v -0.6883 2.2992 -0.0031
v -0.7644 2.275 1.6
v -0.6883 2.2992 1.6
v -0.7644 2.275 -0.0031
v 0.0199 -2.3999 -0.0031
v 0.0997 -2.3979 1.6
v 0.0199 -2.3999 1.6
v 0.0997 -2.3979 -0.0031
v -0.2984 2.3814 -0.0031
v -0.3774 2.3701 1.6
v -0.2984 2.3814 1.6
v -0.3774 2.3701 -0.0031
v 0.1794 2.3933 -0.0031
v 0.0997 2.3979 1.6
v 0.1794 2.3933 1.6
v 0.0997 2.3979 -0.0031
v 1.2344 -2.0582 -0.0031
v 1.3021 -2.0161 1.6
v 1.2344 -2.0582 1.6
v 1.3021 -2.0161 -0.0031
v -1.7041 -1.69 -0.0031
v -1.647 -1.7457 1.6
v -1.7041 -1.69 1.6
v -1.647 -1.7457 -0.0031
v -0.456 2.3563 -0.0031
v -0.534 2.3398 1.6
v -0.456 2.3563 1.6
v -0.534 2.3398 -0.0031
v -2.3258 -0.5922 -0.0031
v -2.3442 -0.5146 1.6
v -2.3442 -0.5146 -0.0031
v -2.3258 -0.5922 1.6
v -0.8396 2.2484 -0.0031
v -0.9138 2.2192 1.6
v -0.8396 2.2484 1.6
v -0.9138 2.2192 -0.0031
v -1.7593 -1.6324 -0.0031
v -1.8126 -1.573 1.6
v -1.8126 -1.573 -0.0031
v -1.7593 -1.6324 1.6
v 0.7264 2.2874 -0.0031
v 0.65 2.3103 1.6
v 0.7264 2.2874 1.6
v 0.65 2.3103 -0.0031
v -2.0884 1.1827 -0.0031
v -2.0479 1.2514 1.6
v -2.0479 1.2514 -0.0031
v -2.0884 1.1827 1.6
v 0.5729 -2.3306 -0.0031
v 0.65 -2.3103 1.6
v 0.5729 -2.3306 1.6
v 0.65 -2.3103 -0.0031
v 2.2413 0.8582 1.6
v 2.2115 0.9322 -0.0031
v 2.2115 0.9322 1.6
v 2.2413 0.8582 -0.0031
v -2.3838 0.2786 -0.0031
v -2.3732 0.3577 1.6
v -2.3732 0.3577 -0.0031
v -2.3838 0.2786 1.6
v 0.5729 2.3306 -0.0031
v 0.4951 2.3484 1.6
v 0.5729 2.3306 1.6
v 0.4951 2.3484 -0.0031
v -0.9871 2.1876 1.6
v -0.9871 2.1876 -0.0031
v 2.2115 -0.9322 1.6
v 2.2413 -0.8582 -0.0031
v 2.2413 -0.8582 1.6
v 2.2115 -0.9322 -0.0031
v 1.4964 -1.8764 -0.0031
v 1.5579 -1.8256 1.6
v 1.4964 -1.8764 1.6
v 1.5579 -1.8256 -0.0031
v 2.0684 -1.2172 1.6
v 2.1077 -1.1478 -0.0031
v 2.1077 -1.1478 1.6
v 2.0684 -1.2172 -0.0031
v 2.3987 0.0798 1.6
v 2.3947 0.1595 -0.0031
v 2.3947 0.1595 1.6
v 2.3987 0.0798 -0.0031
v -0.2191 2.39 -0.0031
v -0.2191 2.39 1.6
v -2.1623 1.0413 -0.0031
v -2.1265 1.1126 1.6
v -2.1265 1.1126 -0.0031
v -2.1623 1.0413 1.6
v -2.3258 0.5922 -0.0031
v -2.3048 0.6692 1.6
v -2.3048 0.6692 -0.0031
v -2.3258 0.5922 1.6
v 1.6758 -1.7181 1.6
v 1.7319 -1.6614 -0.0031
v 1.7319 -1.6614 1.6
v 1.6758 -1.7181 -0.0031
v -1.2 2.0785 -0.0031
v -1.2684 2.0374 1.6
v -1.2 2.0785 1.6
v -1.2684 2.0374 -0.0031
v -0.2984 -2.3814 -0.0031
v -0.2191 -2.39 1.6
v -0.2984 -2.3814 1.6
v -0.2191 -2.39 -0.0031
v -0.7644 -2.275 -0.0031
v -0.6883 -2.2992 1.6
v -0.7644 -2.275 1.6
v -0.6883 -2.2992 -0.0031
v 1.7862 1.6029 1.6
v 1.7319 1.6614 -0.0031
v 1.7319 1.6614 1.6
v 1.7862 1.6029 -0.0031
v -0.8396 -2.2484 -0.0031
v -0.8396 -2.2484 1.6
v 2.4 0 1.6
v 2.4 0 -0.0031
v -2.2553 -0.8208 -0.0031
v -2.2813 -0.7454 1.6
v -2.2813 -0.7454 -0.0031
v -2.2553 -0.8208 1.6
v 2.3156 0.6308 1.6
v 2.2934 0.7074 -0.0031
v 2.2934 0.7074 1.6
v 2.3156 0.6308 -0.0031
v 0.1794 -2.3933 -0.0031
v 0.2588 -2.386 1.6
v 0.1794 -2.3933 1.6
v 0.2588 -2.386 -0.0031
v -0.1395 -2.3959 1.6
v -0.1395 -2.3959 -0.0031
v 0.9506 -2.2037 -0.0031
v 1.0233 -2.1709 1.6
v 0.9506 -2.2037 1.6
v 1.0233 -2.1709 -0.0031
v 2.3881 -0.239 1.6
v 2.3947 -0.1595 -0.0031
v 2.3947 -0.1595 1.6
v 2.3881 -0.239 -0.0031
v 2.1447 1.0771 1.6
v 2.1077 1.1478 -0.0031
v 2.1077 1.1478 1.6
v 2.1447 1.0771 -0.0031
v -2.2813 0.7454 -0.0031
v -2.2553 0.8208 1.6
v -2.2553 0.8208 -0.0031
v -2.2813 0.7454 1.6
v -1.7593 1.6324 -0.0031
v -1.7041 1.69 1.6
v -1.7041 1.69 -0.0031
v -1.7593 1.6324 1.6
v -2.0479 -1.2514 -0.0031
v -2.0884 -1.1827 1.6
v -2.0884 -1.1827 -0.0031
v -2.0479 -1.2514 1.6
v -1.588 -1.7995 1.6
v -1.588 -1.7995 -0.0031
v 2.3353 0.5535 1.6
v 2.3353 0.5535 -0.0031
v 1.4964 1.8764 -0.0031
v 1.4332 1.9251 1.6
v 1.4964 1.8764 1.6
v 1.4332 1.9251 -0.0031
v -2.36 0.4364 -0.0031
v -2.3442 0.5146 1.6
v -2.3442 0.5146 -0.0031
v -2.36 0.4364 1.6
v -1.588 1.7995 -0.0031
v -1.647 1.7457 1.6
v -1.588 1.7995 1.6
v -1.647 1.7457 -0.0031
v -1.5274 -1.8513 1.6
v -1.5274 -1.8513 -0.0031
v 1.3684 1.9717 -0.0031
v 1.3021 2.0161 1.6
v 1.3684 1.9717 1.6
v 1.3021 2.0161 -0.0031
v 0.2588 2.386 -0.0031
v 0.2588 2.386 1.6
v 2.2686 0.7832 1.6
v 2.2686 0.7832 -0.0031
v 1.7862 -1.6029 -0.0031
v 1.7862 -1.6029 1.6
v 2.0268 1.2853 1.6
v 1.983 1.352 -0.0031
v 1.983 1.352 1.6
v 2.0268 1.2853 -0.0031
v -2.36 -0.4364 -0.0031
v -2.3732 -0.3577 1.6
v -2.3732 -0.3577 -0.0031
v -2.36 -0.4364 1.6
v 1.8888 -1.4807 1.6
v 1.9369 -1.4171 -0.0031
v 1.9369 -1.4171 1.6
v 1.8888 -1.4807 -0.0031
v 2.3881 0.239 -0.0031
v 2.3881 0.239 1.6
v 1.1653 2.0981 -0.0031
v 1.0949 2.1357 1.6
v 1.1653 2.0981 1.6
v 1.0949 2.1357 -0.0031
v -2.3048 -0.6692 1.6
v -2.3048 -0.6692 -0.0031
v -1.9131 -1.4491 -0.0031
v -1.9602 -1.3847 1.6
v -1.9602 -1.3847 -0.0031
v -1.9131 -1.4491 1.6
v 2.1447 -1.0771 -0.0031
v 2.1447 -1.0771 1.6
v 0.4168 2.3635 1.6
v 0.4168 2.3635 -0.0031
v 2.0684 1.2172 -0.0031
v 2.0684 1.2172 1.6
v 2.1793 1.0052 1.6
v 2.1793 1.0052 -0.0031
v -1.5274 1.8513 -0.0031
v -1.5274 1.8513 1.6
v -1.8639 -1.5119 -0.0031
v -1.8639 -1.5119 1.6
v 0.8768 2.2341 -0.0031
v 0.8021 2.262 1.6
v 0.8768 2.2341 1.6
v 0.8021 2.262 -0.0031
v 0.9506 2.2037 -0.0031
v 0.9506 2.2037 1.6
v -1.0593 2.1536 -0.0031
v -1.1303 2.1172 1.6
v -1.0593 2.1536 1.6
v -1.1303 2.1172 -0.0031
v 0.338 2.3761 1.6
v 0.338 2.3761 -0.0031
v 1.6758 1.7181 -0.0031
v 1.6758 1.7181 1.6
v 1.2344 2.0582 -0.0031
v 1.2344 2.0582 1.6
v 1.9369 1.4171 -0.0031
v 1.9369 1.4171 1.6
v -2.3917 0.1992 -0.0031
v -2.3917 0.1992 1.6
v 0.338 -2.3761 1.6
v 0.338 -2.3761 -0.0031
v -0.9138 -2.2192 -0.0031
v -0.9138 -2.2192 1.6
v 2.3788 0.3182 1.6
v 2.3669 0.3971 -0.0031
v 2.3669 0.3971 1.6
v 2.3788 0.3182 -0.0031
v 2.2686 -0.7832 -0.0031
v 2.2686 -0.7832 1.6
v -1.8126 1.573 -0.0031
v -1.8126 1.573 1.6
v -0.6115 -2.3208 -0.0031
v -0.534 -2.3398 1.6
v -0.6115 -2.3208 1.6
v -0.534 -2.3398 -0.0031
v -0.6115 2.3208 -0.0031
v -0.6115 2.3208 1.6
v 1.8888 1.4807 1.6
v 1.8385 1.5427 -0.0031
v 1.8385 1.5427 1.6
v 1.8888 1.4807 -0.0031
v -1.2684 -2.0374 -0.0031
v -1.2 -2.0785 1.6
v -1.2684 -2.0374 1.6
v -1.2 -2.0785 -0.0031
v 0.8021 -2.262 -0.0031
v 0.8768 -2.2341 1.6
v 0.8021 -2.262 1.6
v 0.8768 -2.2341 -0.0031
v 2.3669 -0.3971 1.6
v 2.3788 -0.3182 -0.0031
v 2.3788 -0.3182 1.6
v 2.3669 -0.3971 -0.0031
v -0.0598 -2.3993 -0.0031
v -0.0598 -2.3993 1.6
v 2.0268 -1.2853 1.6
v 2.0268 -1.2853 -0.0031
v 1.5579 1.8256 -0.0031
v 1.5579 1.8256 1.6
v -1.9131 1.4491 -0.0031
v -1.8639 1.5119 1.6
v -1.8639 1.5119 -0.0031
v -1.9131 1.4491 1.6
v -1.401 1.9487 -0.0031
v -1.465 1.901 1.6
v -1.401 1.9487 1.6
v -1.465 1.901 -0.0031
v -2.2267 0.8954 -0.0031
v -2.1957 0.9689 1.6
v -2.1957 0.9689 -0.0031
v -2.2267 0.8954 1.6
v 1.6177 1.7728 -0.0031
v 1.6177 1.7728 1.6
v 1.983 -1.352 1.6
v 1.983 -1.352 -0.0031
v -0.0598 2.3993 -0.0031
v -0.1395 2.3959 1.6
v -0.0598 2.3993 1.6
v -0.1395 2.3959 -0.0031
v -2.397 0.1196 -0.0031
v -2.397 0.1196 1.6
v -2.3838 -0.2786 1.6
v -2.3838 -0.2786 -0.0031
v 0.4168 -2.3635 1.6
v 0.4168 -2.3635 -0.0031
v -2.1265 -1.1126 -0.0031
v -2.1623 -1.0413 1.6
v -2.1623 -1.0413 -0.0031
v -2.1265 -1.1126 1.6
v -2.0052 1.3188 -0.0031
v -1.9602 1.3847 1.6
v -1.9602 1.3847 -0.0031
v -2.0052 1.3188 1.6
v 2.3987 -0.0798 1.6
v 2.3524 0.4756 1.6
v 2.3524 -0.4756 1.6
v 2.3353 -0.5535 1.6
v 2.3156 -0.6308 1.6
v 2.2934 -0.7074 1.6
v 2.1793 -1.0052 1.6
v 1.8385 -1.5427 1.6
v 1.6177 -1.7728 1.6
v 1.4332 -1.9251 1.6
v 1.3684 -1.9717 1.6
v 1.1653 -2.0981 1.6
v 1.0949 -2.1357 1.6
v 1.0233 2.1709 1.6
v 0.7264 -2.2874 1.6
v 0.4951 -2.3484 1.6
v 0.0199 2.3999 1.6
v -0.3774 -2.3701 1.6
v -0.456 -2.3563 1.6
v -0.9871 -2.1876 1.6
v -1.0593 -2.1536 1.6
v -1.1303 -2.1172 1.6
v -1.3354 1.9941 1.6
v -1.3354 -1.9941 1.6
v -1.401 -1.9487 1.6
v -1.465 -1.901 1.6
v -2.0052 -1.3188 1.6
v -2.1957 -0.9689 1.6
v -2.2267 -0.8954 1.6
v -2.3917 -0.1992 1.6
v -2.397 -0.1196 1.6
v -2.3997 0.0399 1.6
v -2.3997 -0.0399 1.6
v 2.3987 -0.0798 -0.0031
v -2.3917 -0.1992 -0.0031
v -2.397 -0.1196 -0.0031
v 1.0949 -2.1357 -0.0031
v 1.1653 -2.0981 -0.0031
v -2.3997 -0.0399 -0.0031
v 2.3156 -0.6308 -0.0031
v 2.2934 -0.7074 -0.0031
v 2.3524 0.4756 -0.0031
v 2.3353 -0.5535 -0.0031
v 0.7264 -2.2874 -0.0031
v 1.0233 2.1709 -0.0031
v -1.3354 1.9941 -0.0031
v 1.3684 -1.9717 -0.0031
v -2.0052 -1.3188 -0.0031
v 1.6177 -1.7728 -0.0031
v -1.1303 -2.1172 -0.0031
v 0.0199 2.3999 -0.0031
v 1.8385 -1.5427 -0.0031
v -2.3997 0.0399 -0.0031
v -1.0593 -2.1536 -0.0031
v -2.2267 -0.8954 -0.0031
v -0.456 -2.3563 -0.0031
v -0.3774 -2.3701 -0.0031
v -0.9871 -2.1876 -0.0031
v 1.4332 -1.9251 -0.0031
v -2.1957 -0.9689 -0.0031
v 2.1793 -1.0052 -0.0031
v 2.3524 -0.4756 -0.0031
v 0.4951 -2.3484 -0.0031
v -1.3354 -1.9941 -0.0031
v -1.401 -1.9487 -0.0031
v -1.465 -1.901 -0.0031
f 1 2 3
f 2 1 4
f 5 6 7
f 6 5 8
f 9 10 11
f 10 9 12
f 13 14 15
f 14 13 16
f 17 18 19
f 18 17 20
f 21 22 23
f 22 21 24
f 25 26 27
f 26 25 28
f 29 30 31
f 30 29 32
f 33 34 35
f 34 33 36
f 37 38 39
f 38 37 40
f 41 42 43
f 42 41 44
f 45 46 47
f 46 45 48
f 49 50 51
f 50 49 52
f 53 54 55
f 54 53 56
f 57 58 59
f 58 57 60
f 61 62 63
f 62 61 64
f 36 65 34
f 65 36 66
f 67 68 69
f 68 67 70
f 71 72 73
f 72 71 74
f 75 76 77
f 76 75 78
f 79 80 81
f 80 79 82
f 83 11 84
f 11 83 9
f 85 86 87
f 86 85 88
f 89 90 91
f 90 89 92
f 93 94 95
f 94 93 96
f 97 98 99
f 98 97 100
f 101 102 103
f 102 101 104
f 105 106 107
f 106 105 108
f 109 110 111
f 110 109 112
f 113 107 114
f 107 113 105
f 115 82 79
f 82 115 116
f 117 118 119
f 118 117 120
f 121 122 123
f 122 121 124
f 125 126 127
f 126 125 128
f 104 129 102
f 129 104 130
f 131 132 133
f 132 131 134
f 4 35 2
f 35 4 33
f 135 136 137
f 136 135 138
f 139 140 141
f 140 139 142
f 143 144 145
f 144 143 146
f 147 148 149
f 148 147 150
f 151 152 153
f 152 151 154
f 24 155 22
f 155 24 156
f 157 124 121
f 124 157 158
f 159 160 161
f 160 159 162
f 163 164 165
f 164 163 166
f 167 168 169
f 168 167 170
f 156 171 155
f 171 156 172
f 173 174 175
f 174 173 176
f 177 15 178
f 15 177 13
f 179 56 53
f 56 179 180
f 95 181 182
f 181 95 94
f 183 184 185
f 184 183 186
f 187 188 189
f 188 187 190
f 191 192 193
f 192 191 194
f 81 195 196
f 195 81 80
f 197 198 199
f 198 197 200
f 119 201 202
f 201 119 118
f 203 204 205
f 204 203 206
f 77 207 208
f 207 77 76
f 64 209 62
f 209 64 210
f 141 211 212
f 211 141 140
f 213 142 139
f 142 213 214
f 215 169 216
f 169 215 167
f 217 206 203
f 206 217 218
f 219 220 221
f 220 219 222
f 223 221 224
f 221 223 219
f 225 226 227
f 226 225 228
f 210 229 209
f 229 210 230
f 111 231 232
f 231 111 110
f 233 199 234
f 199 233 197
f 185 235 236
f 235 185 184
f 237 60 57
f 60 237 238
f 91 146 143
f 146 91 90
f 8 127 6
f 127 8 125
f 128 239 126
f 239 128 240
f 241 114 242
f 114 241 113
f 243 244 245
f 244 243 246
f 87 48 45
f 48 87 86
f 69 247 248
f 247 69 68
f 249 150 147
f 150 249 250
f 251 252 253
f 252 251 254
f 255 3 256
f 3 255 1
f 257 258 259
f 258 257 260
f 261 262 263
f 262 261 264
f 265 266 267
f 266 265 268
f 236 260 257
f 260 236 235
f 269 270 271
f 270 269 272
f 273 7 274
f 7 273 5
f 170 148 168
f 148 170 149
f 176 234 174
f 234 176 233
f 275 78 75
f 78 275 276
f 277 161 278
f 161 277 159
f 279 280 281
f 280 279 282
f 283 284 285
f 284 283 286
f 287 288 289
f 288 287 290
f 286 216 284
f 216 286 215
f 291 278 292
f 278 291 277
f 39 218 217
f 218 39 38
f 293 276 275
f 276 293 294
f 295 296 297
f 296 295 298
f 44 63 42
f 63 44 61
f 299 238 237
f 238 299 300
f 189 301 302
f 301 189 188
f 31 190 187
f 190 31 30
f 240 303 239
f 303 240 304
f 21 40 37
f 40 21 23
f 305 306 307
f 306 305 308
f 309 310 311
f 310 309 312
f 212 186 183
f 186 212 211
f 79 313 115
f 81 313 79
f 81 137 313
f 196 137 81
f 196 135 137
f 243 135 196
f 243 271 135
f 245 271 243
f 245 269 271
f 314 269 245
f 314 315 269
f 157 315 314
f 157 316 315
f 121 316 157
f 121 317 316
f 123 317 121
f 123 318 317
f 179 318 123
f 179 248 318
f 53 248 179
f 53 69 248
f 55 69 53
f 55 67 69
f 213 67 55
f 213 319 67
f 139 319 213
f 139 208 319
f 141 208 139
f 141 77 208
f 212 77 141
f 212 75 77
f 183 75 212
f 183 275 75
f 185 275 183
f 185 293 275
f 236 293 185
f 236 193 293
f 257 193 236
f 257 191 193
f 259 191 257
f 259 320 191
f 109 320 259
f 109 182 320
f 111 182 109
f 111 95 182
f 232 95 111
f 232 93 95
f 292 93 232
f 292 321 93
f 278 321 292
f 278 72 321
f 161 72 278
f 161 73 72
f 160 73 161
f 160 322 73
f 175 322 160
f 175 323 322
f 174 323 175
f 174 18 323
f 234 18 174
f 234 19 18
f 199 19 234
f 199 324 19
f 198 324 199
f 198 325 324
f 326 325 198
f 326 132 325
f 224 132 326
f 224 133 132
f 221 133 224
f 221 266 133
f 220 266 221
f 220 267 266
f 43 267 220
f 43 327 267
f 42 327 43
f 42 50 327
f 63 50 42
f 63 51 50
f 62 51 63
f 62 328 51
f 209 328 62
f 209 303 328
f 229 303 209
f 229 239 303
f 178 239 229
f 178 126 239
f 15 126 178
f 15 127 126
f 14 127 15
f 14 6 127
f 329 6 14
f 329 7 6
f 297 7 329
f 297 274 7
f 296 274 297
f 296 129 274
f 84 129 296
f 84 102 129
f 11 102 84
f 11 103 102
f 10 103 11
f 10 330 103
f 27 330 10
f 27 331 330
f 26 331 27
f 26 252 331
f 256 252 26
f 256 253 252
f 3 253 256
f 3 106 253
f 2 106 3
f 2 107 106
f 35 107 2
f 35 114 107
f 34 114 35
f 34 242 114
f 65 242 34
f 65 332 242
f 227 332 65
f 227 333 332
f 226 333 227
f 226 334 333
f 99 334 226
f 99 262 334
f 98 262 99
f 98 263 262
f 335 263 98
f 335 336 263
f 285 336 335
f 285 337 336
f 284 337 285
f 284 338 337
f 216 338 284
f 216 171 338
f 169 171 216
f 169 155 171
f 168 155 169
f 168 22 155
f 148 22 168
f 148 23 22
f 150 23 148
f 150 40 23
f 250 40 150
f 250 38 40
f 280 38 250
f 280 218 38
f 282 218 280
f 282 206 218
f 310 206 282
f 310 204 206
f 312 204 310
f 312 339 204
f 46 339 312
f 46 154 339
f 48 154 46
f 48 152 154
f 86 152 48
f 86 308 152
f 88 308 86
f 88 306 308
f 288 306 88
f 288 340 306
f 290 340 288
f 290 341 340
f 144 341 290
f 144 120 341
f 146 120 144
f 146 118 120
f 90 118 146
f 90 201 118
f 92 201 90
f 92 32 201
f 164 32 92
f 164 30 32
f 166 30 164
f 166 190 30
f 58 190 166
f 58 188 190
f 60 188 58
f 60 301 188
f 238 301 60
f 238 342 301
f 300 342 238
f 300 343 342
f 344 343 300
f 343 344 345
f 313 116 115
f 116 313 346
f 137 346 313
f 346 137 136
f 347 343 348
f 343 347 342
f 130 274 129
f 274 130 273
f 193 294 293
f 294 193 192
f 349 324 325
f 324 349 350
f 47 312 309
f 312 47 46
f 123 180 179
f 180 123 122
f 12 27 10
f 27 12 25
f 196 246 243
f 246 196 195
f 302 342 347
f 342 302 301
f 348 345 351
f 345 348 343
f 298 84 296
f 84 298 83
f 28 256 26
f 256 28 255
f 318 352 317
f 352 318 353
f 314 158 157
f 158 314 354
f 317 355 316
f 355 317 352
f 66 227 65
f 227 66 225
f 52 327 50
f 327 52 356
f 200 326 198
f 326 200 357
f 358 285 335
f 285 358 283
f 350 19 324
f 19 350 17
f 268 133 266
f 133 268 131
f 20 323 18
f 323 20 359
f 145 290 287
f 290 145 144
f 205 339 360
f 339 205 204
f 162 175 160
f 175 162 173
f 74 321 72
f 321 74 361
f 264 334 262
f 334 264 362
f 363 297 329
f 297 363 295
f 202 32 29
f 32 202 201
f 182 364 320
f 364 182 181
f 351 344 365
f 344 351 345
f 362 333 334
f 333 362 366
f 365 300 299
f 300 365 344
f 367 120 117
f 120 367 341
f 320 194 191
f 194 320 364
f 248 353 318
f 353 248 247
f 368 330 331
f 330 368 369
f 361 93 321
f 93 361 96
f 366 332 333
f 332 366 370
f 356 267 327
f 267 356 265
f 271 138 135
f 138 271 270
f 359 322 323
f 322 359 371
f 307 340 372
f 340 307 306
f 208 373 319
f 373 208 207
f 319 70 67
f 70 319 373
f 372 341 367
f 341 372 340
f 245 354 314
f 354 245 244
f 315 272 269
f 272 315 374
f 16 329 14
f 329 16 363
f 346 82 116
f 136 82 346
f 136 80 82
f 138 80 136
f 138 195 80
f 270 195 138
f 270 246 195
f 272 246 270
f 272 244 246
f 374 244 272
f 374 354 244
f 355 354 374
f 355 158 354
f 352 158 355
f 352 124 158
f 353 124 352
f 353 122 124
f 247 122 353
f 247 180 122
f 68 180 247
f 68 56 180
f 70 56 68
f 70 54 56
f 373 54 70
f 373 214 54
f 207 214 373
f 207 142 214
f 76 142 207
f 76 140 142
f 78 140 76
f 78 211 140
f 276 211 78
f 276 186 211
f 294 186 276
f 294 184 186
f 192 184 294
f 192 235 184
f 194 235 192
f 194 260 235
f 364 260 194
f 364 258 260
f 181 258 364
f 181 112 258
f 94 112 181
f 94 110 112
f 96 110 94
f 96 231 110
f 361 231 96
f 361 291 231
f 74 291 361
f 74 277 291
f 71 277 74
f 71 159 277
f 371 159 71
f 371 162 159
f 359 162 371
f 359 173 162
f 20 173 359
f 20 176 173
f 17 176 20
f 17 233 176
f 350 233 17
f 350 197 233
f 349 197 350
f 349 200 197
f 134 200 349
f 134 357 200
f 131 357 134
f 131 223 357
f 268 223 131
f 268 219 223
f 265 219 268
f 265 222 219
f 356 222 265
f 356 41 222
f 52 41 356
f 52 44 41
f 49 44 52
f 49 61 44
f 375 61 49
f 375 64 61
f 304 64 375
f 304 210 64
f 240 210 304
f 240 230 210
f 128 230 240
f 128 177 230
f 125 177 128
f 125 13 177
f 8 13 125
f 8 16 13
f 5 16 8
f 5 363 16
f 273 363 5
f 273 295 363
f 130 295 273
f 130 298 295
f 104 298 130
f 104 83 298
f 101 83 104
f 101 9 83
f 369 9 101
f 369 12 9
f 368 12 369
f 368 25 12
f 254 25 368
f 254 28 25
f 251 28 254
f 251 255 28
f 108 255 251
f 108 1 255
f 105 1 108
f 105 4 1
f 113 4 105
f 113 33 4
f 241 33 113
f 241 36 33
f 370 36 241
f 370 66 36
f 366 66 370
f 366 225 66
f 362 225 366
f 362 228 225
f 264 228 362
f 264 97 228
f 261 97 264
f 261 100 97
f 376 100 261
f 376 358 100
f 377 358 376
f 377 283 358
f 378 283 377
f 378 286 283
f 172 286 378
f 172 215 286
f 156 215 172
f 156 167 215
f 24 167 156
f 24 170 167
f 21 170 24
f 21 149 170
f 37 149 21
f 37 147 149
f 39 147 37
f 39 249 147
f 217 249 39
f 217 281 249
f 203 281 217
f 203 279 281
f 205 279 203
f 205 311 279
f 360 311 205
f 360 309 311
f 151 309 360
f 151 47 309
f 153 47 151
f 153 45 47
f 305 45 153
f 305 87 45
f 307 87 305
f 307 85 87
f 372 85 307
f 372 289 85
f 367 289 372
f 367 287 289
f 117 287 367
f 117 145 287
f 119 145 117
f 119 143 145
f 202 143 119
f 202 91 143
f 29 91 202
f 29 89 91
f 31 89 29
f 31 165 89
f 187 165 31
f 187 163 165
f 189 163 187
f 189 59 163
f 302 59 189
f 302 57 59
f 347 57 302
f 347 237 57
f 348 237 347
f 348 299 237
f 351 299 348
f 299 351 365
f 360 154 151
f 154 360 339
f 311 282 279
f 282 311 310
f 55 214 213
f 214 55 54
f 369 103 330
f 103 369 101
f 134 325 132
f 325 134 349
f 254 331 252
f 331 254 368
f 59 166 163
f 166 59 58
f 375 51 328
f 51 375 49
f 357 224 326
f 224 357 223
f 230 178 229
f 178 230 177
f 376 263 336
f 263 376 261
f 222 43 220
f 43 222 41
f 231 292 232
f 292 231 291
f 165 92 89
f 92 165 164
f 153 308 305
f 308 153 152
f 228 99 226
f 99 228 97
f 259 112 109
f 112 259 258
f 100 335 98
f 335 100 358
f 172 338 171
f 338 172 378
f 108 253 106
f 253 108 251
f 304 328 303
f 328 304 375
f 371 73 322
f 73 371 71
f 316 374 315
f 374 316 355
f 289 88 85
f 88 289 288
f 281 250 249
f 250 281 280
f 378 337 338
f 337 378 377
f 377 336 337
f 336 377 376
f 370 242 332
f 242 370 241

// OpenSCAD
use <../lib.scad>
use <3188.scad>
$fa=1; $fs=0.2;
function ldraw_lib__159(realsolid=false) = [
// 0 ~Moved to 3188
// 0 Name: 159.dat
// 0 Author: [PTadmin]
// 0 !LDRAW_ORG Part UPDATE 1998-06
// 0 !LICENSE Licensed under CC BY 4.0 : see CAreadme.txt
// 
// 0 BFC CERTIFY CCW
  [0,"BFC","CERTIFY"],
  [0,"BFC","CCW"],
// 
// 0 !HISTORY 1998-06-20 [PTadmin] Official Update 1998-06
// 0 !HISTORY 2007-05-10 [PTadmin] Header formatted for Contributor Agreement
// 0 !HISTORY 2008-07-01 [PTadmin] Official Update 2008-01
// 
// 
// 1 16 0 0 0 1 0 0 0 1 0 0 0 1 3188.dat
  [1,16,0,0,0,1,0,0,0,1,0,0,0,1, ldraw_lib__3188(realsolid)],
];
module ldraw_lib__159(step=0, col=false, unit=2/5, alt=false, line=0.2, solid=!$preview)
    makepoly(ldraw_lib__159(solid), step=step, col=col, unit=unit, alt=alt, line=line, solid=solid);
ldraw_lib__159(line=0.2);
